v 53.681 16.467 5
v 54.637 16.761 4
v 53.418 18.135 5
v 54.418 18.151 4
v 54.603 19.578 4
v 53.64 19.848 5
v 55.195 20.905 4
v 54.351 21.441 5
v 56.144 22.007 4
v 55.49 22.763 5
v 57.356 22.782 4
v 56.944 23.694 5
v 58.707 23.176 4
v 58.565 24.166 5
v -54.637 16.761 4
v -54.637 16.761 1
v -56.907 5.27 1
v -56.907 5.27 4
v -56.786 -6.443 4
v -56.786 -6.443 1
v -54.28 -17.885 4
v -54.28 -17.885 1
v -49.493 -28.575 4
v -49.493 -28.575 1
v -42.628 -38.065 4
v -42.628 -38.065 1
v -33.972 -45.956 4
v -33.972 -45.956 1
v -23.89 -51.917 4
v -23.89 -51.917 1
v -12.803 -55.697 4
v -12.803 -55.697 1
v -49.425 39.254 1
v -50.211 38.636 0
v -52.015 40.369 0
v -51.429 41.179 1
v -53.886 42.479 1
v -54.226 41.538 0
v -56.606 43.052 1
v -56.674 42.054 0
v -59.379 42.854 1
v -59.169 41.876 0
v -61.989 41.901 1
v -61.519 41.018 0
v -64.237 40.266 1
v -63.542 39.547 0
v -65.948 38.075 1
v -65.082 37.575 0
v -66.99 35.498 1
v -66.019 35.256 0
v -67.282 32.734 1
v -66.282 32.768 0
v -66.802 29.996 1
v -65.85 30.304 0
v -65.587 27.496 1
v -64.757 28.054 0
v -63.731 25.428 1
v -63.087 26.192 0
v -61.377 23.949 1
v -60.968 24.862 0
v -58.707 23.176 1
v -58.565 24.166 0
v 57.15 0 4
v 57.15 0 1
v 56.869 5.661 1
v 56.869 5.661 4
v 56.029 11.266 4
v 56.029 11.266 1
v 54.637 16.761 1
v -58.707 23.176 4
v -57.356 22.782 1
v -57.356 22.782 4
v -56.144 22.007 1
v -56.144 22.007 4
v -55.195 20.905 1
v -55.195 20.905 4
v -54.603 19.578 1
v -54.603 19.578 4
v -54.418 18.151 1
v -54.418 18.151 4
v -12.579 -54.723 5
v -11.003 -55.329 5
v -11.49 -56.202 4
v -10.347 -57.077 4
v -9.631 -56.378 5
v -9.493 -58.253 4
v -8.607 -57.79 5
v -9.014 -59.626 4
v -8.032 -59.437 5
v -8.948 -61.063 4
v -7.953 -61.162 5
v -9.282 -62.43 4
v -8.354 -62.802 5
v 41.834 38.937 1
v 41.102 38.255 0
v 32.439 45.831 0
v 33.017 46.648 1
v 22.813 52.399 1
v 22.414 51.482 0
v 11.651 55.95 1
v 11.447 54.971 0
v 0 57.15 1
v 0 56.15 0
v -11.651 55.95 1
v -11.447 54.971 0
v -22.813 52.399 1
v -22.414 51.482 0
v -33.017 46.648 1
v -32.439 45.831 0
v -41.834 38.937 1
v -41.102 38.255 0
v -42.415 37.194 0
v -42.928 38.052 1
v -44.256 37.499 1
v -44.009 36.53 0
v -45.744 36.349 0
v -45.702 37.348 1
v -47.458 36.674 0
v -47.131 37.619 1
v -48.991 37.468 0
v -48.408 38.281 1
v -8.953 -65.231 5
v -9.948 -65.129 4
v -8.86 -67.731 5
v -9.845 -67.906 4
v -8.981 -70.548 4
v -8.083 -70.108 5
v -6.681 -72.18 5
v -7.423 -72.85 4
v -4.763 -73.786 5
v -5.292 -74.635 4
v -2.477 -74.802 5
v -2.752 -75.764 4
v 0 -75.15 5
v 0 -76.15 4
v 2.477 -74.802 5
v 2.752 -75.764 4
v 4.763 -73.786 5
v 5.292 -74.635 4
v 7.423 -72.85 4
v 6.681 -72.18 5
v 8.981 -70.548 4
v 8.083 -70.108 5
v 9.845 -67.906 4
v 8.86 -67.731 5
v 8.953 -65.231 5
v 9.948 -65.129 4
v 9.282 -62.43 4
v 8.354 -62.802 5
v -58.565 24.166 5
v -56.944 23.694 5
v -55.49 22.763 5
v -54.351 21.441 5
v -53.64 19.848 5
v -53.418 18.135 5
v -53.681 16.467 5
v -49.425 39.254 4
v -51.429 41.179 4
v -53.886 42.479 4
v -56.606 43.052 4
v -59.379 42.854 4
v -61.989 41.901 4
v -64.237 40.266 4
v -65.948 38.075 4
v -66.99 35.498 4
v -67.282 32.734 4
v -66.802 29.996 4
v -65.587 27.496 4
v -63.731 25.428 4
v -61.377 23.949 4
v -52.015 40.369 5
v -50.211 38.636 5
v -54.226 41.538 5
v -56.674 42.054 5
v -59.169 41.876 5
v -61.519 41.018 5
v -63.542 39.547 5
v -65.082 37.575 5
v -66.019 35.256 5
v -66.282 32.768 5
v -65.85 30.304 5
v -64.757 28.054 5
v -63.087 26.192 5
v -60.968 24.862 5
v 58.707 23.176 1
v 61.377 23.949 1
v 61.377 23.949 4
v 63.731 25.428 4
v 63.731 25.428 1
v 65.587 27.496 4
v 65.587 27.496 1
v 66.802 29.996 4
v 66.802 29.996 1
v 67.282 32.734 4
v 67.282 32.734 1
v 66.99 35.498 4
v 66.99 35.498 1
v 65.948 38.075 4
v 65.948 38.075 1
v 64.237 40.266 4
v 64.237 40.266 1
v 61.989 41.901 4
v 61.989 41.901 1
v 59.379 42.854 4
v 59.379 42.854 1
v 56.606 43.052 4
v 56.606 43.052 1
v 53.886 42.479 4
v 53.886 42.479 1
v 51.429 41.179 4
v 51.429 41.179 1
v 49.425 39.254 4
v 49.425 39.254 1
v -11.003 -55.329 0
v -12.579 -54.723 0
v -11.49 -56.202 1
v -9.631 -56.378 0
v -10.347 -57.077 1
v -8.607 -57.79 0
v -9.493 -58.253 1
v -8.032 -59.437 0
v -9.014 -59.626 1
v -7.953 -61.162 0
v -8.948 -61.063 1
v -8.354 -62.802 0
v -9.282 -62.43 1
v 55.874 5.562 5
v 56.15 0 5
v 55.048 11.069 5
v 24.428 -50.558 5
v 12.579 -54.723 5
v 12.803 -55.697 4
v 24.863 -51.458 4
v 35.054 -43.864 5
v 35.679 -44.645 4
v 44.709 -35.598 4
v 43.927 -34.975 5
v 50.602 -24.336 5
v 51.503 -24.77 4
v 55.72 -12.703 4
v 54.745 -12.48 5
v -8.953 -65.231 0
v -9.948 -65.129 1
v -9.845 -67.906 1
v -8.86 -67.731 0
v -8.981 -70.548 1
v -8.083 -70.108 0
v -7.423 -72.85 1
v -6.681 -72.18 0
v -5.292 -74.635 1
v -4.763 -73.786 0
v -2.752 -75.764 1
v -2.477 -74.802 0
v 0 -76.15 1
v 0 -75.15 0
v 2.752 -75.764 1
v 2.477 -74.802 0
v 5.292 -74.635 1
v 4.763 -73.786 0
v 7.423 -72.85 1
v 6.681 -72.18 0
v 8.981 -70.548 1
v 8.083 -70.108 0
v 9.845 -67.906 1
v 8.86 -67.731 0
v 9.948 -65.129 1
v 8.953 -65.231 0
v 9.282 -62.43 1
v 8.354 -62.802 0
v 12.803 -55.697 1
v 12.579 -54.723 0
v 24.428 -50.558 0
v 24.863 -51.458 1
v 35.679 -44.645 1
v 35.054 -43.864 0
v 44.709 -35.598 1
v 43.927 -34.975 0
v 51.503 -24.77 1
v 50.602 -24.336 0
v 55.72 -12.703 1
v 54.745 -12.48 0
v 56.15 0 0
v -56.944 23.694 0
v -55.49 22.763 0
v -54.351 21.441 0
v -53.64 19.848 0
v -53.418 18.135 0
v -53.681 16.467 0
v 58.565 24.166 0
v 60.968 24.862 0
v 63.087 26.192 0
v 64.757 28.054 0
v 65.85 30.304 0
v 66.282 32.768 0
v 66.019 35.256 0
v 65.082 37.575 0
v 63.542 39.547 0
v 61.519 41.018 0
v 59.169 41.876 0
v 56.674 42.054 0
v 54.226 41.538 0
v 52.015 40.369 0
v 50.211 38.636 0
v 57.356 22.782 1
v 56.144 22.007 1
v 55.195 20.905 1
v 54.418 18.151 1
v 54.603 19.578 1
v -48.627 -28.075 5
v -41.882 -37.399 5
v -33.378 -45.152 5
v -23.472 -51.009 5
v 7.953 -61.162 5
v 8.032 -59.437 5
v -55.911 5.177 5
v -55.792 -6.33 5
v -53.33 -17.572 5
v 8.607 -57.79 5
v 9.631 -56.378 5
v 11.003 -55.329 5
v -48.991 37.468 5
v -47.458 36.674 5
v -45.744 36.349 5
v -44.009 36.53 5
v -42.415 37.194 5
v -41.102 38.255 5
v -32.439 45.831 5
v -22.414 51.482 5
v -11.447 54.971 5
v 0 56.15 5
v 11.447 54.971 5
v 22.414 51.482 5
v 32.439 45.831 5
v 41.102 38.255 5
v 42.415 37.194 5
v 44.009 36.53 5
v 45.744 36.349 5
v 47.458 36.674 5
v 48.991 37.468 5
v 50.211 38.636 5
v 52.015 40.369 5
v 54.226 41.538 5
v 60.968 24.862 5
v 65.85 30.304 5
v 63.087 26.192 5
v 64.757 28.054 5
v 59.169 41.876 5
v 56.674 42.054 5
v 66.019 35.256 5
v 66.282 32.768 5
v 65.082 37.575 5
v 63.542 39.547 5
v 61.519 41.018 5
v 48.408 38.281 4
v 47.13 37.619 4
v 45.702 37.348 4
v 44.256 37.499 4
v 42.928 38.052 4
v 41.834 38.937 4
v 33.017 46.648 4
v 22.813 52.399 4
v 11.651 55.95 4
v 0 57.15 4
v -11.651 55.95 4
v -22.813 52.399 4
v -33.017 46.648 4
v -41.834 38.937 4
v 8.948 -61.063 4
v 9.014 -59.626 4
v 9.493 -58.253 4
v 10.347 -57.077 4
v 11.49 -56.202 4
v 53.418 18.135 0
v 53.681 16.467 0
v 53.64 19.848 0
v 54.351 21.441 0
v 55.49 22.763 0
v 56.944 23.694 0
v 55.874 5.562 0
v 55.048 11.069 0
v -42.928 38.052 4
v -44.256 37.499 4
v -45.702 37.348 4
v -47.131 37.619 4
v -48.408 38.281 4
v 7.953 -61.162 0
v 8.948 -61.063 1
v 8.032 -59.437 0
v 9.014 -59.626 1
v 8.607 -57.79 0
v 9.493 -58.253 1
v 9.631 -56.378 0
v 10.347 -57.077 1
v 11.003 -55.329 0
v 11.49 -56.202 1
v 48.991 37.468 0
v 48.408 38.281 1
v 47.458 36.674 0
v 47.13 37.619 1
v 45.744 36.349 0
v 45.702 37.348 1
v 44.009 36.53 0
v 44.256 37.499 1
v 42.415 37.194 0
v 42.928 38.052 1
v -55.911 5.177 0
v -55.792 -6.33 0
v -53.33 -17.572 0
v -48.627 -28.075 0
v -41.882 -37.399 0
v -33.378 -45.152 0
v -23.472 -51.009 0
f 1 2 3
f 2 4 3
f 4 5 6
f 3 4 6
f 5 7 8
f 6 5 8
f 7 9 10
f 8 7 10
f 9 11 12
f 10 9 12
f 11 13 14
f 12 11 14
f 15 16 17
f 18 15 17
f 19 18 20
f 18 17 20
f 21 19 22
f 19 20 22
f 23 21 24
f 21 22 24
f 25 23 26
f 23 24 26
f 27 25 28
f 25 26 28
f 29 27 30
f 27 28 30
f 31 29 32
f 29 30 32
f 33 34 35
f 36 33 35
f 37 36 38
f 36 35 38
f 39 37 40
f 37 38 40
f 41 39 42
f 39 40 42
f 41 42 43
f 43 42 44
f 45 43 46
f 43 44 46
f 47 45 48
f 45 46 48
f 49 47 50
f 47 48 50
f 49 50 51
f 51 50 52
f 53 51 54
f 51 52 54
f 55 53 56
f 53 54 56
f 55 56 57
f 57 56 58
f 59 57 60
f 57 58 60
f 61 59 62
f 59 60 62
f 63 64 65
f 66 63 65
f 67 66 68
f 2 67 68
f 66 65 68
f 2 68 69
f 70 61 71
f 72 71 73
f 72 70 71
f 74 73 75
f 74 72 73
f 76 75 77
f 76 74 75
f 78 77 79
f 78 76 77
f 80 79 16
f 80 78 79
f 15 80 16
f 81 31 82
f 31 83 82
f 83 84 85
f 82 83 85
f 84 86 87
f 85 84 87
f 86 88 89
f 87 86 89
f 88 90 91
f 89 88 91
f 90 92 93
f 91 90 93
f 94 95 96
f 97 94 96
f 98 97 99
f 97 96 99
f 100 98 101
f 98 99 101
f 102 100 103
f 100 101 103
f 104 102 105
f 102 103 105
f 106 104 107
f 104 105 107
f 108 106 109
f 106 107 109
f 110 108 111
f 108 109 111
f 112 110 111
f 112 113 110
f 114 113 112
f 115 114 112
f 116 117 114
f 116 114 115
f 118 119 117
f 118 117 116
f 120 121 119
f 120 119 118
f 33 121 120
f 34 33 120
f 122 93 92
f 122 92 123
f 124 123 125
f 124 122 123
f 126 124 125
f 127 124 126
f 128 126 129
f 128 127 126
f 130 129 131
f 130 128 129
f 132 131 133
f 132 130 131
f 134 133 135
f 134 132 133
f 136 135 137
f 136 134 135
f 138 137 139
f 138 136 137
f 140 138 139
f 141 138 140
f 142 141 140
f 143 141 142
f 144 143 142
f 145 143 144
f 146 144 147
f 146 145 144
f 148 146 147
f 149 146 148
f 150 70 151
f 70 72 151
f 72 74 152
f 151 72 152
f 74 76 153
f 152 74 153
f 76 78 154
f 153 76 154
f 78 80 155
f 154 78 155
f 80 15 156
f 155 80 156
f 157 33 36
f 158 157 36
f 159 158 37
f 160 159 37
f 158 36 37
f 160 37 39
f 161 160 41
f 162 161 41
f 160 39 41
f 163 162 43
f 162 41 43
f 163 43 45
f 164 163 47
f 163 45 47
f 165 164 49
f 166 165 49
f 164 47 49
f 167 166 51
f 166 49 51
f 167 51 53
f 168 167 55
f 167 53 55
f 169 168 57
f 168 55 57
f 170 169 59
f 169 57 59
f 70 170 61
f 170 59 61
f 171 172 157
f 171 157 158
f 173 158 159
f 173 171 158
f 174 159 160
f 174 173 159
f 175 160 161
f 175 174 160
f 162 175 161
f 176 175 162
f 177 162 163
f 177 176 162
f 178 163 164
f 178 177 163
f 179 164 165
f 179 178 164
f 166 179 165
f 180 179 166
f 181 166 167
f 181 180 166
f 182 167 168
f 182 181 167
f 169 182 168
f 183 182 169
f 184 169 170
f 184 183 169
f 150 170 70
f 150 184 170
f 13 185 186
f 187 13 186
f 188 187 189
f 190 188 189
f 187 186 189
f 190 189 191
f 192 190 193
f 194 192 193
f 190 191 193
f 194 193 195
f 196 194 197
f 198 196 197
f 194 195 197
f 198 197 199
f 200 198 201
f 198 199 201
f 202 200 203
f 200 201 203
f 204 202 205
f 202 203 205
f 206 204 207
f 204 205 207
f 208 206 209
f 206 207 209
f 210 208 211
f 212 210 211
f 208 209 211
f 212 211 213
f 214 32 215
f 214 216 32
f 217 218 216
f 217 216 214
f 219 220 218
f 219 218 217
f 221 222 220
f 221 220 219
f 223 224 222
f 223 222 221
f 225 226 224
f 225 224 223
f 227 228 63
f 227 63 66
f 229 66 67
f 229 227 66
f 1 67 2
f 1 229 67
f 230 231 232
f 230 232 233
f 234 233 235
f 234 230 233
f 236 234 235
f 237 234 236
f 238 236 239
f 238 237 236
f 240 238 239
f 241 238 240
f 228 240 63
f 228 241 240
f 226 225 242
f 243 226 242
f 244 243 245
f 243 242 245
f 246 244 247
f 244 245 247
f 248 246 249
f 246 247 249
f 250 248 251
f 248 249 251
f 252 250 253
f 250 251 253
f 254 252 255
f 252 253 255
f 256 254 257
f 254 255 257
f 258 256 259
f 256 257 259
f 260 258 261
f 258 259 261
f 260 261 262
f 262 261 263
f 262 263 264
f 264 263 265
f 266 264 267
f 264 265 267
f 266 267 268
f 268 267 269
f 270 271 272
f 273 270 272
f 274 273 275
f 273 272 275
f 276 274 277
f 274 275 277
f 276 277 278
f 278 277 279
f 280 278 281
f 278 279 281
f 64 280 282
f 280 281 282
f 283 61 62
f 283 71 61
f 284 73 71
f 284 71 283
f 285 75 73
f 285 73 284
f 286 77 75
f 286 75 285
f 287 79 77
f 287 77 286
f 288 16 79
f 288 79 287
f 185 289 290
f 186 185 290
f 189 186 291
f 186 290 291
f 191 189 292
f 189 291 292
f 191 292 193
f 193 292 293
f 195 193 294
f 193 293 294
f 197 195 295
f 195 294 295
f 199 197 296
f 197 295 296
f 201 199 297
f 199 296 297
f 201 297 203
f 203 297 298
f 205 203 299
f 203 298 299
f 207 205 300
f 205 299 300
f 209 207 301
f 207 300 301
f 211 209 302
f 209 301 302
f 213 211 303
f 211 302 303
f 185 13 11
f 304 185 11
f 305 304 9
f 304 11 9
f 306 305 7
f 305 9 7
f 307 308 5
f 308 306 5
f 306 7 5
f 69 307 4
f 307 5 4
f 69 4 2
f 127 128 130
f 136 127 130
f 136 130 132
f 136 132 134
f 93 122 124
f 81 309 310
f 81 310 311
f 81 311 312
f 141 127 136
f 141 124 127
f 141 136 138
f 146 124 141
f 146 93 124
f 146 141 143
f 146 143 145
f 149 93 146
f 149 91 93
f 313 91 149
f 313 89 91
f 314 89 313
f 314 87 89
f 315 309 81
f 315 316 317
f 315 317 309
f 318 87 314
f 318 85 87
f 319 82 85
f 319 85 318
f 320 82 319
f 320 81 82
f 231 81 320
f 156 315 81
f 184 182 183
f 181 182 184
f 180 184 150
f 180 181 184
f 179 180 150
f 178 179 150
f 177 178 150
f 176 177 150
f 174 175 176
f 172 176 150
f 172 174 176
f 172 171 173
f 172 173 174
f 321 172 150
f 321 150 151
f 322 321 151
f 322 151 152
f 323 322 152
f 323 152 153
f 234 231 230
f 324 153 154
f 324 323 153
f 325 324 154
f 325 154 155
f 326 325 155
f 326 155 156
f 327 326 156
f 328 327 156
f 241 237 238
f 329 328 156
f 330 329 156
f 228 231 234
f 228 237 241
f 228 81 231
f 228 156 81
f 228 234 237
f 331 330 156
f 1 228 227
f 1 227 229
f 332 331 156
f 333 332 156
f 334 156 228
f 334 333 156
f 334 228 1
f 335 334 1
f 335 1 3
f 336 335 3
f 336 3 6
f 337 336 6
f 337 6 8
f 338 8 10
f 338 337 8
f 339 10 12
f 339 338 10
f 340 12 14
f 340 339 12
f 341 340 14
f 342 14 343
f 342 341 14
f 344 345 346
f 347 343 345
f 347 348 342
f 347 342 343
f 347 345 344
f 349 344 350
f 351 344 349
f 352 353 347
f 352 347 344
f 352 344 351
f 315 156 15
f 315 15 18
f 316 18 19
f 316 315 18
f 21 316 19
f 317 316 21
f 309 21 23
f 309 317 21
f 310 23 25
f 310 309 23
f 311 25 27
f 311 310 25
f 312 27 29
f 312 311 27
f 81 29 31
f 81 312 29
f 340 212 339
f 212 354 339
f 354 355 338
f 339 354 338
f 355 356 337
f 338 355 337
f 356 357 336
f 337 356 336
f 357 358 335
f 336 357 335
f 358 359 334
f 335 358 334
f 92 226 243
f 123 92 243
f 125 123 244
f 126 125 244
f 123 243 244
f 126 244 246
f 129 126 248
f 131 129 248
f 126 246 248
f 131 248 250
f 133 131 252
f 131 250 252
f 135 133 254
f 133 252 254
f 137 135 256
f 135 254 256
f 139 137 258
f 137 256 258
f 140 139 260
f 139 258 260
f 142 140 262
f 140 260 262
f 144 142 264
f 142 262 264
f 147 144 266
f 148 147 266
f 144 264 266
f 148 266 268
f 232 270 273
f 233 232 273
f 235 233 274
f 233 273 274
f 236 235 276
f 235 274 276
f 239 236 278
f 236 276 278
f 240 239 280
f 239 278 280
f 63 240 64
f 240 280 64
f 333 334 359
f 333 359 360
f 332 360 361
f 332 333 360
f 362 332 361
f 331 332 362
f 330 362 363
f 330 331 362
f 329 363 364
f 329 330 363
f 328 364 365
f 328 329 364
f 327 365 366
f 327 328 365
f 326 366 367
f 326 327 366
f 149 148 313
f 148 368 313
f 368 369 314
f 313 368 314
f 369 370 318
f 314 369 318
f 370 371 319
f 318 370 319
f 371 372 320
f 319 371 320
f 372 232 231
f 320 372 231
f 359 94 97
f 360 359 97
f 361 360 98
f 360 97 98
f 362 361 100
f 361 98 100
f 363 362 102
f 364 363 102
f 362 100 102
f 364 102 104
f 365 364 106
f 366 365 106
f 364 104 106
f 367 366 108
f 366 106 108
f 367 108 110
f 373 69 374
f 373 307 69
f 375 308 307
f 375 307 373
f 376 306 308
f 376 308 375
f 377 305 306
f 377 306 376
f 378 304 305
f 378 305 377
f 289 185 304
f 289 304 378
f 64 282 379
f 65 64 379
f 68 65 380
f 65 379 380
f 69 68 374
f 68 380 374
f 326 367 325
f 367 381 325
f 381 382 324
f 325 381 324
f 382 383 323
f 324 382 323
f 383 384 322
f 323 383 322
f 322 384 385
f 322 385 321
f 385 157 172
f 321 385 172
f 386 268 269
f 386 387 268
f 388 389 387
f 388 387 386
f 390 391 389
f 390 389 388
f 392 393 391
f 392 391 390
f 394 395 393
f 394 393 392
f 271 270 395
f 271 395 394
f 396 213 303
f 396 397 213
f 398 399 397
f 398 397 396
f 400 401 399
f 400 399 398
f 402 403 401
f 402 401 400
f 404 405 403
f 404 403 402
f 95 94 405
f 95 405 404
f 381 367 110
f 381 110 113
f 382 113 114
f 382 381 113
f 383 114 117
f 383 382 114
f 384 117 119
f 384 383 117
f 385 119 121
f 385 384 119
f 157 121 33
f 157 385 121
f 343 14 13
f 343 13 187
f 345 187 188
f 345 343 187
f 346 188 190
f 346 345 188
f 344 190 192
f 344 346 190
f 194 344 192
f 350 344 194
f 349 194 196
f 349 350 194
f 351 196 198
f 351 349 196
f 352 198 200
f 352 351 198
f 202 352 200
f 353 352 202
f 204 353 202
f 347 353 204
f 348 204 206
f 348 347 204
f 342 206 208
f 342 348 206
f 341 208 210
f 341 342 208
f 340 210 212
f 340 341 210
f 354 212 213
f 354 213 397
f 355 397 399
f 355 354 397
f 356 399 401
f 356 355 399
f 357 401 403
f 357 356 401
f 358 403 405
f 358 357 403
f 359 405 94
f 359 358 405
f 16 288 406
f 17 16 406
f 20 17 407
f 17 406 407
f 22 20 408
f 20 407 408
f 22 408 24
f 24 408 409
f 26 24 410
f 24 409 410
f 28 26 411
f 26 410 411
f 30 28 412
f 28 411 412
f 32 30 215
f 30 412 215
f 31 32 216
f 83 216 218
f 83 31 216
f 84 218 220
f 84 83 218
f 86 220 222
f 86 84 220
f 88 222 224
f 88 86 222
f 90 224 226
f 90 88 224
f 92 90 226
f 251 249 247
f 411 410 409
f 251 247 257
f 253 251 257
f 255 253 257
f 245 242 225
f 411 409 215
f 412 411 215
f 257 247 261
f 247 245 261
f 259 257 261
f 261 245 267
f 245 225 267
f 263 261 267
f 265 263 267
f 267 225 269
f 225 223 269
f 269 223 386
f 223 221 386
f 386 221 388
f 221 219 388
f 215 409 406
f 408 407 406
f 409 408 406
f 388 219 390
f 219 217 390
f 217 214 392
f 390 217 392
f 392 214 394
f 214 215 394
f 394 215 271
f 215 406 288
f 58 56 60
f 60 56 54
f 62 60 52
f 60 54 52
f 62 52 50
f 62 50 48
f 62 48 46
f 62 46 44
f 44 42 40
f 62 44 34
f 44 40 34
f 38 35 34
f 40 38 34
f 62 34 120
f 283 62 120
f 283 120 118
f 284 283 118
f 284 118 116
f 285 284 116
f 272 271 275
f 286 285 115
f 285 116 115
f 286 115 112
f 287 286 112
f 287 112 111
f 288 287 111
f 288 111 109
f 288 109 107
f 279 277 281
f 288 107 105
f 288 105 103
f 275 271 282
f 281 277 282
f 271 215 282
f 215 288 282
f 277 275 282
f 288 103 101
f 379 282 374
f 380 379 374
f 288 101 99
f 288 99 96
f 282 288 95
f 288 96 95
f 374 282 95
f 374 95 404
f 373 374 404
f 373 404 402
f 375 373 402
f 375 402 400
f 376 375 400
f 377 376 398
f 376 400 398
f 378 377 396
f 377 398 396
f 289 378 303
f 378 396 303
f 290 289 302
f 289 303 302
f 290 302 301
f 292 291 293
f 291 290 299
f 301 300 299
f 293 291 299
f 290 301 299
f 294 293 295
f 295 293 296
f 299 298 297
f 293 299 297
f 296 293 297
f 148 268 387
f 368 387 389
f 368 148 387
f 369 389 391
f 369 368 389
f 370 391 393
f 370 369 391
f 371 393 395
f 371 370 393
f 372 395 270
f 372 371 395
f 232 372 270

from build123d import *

# Parameters (mm, degrees)
F1_DEPTH = 5
F2_R     = 5
F3_SIZE  = 1


with BuildPart() as f1:
    # F0 (on Top) → F1 (new body)
    with BuildSketch(Plane.XY):
        with BuildLine():
            ThreePointArc((47.3444830059, 32.0097239742), (49.4933518263, 28.575), (51.3934756327, 24.996663025))
            ThreePointArc((51.3934756327, 24.996663025), (65.9478344982, 38.075), (47.3444830059, 32.0097239742))
        make_face()
        with BuildLine():
            ThreePointArc((4.0489926269, -57.0063869992), (41.8181923846, -38.9533218826), (57.15, 0))
            ThreePointArc((57.15, 0), (55.6922778867, 12.8254701198), (51.3934756327, 24.996663025))
            ThreePointArc((51.3934756327, 24.996663025), (49.4933518263, 28.575), (47.3444830059, 32.0097239742))
            ThreePointArc((47.3444830059, 32.0097239742), (0, 57.15), (-47.3444830059, 32.0097239742))
            ThreePointArc((-47.3444830059, 32.0097239742), (-49.4933518263, 28.575), (-51.3934756327, 24.996663025))
            ThreePointArc((-51.3934756327, 24.996663025), (-49.4933518263, -28.575), (-4.0489926269, -57.0063869992))
            ThreePointArc((-4.0489926269, -57.0063869992), (0, -57.15), (4.0489926269, -57.0063869992))
        make_face()
        with BuildLine():
            ThreePointArc((-51.3934756327, 24.996663025), (-49.4933518263, 28.575), (-47.3444830059, 32.0097239742))
            ThreePointArc((-47.3444830059, 32.0097239742), (-65.9478344982, 38.075), (-51.3934756327, 24.996663025))
        make_face()
        with BuildLine():
            ThreePointArc((-4.0489926269, -57.0063869992), (0, -76.15), (4.0489926269, -57.0063869992))
            ThreePointArc((4.0489926269, -57.0063869992), (0, -57.15), (-4.0489926269, -57.0063869992))
        make_face()
    extrude(amount=F1_DEPTH)

    # F2
    f2_edges = [f1.edges().sort_by_distance(p)[0] for p in [
        (-4.048993, -57.006387, 2.5),
        (-47.344483, 32.009724, 2.5),
        (51.393476, 24.996663, 2.5),
        (47.344483, 32.009724, 2.5),
        (-51.393476, 24.996663, 2.5),
        (4.048993, -57.006387, 2.5),
    ]]
    fillet(f2_edges, radius=F2_R)

    # F3
    f3_edges = [f1.edges().sort_by_distance(p)[0] for p in [
        (65.947834, 38.075, 5),
        (55.195163, 20.905484, 5),
        (45.702262, 37.347671, 5),
        (49.493352, -28.575, 5),
        (0, 57.15, 5),
        (9.492901, -58.253155, 5),
        (-45.702262, 37.347671, 5),
        (0, -76.15, 5),
        (-65.947834, 38.075, 5),
        (-9.492901, -58.253155, 5),
        (-55.195163, 20.905484, 5),
        (-49.493352, -28.575, 5),
        (65.947834, 38.075, 0),
        (55.195163, 20.905484, 0),
        (45.702262, 37.347671, 0),
        (49.493352, -28.575, 0),
        (0, 57.15, 0),
        (9.492901, -58.253155, 0),
        (-45.702262, 37.347671, 0),
        (0, -76.15, 0),
        (-65.947834, 38.075, 0),
        (-9.492901, -58.253155, 0),
        (-55.195163, 20.905484, 0),
        (-49.493352, -28.575, 0),
    ]]
    chamfer(f3_edges, length=F3_SIZE)


solid = f1.part
